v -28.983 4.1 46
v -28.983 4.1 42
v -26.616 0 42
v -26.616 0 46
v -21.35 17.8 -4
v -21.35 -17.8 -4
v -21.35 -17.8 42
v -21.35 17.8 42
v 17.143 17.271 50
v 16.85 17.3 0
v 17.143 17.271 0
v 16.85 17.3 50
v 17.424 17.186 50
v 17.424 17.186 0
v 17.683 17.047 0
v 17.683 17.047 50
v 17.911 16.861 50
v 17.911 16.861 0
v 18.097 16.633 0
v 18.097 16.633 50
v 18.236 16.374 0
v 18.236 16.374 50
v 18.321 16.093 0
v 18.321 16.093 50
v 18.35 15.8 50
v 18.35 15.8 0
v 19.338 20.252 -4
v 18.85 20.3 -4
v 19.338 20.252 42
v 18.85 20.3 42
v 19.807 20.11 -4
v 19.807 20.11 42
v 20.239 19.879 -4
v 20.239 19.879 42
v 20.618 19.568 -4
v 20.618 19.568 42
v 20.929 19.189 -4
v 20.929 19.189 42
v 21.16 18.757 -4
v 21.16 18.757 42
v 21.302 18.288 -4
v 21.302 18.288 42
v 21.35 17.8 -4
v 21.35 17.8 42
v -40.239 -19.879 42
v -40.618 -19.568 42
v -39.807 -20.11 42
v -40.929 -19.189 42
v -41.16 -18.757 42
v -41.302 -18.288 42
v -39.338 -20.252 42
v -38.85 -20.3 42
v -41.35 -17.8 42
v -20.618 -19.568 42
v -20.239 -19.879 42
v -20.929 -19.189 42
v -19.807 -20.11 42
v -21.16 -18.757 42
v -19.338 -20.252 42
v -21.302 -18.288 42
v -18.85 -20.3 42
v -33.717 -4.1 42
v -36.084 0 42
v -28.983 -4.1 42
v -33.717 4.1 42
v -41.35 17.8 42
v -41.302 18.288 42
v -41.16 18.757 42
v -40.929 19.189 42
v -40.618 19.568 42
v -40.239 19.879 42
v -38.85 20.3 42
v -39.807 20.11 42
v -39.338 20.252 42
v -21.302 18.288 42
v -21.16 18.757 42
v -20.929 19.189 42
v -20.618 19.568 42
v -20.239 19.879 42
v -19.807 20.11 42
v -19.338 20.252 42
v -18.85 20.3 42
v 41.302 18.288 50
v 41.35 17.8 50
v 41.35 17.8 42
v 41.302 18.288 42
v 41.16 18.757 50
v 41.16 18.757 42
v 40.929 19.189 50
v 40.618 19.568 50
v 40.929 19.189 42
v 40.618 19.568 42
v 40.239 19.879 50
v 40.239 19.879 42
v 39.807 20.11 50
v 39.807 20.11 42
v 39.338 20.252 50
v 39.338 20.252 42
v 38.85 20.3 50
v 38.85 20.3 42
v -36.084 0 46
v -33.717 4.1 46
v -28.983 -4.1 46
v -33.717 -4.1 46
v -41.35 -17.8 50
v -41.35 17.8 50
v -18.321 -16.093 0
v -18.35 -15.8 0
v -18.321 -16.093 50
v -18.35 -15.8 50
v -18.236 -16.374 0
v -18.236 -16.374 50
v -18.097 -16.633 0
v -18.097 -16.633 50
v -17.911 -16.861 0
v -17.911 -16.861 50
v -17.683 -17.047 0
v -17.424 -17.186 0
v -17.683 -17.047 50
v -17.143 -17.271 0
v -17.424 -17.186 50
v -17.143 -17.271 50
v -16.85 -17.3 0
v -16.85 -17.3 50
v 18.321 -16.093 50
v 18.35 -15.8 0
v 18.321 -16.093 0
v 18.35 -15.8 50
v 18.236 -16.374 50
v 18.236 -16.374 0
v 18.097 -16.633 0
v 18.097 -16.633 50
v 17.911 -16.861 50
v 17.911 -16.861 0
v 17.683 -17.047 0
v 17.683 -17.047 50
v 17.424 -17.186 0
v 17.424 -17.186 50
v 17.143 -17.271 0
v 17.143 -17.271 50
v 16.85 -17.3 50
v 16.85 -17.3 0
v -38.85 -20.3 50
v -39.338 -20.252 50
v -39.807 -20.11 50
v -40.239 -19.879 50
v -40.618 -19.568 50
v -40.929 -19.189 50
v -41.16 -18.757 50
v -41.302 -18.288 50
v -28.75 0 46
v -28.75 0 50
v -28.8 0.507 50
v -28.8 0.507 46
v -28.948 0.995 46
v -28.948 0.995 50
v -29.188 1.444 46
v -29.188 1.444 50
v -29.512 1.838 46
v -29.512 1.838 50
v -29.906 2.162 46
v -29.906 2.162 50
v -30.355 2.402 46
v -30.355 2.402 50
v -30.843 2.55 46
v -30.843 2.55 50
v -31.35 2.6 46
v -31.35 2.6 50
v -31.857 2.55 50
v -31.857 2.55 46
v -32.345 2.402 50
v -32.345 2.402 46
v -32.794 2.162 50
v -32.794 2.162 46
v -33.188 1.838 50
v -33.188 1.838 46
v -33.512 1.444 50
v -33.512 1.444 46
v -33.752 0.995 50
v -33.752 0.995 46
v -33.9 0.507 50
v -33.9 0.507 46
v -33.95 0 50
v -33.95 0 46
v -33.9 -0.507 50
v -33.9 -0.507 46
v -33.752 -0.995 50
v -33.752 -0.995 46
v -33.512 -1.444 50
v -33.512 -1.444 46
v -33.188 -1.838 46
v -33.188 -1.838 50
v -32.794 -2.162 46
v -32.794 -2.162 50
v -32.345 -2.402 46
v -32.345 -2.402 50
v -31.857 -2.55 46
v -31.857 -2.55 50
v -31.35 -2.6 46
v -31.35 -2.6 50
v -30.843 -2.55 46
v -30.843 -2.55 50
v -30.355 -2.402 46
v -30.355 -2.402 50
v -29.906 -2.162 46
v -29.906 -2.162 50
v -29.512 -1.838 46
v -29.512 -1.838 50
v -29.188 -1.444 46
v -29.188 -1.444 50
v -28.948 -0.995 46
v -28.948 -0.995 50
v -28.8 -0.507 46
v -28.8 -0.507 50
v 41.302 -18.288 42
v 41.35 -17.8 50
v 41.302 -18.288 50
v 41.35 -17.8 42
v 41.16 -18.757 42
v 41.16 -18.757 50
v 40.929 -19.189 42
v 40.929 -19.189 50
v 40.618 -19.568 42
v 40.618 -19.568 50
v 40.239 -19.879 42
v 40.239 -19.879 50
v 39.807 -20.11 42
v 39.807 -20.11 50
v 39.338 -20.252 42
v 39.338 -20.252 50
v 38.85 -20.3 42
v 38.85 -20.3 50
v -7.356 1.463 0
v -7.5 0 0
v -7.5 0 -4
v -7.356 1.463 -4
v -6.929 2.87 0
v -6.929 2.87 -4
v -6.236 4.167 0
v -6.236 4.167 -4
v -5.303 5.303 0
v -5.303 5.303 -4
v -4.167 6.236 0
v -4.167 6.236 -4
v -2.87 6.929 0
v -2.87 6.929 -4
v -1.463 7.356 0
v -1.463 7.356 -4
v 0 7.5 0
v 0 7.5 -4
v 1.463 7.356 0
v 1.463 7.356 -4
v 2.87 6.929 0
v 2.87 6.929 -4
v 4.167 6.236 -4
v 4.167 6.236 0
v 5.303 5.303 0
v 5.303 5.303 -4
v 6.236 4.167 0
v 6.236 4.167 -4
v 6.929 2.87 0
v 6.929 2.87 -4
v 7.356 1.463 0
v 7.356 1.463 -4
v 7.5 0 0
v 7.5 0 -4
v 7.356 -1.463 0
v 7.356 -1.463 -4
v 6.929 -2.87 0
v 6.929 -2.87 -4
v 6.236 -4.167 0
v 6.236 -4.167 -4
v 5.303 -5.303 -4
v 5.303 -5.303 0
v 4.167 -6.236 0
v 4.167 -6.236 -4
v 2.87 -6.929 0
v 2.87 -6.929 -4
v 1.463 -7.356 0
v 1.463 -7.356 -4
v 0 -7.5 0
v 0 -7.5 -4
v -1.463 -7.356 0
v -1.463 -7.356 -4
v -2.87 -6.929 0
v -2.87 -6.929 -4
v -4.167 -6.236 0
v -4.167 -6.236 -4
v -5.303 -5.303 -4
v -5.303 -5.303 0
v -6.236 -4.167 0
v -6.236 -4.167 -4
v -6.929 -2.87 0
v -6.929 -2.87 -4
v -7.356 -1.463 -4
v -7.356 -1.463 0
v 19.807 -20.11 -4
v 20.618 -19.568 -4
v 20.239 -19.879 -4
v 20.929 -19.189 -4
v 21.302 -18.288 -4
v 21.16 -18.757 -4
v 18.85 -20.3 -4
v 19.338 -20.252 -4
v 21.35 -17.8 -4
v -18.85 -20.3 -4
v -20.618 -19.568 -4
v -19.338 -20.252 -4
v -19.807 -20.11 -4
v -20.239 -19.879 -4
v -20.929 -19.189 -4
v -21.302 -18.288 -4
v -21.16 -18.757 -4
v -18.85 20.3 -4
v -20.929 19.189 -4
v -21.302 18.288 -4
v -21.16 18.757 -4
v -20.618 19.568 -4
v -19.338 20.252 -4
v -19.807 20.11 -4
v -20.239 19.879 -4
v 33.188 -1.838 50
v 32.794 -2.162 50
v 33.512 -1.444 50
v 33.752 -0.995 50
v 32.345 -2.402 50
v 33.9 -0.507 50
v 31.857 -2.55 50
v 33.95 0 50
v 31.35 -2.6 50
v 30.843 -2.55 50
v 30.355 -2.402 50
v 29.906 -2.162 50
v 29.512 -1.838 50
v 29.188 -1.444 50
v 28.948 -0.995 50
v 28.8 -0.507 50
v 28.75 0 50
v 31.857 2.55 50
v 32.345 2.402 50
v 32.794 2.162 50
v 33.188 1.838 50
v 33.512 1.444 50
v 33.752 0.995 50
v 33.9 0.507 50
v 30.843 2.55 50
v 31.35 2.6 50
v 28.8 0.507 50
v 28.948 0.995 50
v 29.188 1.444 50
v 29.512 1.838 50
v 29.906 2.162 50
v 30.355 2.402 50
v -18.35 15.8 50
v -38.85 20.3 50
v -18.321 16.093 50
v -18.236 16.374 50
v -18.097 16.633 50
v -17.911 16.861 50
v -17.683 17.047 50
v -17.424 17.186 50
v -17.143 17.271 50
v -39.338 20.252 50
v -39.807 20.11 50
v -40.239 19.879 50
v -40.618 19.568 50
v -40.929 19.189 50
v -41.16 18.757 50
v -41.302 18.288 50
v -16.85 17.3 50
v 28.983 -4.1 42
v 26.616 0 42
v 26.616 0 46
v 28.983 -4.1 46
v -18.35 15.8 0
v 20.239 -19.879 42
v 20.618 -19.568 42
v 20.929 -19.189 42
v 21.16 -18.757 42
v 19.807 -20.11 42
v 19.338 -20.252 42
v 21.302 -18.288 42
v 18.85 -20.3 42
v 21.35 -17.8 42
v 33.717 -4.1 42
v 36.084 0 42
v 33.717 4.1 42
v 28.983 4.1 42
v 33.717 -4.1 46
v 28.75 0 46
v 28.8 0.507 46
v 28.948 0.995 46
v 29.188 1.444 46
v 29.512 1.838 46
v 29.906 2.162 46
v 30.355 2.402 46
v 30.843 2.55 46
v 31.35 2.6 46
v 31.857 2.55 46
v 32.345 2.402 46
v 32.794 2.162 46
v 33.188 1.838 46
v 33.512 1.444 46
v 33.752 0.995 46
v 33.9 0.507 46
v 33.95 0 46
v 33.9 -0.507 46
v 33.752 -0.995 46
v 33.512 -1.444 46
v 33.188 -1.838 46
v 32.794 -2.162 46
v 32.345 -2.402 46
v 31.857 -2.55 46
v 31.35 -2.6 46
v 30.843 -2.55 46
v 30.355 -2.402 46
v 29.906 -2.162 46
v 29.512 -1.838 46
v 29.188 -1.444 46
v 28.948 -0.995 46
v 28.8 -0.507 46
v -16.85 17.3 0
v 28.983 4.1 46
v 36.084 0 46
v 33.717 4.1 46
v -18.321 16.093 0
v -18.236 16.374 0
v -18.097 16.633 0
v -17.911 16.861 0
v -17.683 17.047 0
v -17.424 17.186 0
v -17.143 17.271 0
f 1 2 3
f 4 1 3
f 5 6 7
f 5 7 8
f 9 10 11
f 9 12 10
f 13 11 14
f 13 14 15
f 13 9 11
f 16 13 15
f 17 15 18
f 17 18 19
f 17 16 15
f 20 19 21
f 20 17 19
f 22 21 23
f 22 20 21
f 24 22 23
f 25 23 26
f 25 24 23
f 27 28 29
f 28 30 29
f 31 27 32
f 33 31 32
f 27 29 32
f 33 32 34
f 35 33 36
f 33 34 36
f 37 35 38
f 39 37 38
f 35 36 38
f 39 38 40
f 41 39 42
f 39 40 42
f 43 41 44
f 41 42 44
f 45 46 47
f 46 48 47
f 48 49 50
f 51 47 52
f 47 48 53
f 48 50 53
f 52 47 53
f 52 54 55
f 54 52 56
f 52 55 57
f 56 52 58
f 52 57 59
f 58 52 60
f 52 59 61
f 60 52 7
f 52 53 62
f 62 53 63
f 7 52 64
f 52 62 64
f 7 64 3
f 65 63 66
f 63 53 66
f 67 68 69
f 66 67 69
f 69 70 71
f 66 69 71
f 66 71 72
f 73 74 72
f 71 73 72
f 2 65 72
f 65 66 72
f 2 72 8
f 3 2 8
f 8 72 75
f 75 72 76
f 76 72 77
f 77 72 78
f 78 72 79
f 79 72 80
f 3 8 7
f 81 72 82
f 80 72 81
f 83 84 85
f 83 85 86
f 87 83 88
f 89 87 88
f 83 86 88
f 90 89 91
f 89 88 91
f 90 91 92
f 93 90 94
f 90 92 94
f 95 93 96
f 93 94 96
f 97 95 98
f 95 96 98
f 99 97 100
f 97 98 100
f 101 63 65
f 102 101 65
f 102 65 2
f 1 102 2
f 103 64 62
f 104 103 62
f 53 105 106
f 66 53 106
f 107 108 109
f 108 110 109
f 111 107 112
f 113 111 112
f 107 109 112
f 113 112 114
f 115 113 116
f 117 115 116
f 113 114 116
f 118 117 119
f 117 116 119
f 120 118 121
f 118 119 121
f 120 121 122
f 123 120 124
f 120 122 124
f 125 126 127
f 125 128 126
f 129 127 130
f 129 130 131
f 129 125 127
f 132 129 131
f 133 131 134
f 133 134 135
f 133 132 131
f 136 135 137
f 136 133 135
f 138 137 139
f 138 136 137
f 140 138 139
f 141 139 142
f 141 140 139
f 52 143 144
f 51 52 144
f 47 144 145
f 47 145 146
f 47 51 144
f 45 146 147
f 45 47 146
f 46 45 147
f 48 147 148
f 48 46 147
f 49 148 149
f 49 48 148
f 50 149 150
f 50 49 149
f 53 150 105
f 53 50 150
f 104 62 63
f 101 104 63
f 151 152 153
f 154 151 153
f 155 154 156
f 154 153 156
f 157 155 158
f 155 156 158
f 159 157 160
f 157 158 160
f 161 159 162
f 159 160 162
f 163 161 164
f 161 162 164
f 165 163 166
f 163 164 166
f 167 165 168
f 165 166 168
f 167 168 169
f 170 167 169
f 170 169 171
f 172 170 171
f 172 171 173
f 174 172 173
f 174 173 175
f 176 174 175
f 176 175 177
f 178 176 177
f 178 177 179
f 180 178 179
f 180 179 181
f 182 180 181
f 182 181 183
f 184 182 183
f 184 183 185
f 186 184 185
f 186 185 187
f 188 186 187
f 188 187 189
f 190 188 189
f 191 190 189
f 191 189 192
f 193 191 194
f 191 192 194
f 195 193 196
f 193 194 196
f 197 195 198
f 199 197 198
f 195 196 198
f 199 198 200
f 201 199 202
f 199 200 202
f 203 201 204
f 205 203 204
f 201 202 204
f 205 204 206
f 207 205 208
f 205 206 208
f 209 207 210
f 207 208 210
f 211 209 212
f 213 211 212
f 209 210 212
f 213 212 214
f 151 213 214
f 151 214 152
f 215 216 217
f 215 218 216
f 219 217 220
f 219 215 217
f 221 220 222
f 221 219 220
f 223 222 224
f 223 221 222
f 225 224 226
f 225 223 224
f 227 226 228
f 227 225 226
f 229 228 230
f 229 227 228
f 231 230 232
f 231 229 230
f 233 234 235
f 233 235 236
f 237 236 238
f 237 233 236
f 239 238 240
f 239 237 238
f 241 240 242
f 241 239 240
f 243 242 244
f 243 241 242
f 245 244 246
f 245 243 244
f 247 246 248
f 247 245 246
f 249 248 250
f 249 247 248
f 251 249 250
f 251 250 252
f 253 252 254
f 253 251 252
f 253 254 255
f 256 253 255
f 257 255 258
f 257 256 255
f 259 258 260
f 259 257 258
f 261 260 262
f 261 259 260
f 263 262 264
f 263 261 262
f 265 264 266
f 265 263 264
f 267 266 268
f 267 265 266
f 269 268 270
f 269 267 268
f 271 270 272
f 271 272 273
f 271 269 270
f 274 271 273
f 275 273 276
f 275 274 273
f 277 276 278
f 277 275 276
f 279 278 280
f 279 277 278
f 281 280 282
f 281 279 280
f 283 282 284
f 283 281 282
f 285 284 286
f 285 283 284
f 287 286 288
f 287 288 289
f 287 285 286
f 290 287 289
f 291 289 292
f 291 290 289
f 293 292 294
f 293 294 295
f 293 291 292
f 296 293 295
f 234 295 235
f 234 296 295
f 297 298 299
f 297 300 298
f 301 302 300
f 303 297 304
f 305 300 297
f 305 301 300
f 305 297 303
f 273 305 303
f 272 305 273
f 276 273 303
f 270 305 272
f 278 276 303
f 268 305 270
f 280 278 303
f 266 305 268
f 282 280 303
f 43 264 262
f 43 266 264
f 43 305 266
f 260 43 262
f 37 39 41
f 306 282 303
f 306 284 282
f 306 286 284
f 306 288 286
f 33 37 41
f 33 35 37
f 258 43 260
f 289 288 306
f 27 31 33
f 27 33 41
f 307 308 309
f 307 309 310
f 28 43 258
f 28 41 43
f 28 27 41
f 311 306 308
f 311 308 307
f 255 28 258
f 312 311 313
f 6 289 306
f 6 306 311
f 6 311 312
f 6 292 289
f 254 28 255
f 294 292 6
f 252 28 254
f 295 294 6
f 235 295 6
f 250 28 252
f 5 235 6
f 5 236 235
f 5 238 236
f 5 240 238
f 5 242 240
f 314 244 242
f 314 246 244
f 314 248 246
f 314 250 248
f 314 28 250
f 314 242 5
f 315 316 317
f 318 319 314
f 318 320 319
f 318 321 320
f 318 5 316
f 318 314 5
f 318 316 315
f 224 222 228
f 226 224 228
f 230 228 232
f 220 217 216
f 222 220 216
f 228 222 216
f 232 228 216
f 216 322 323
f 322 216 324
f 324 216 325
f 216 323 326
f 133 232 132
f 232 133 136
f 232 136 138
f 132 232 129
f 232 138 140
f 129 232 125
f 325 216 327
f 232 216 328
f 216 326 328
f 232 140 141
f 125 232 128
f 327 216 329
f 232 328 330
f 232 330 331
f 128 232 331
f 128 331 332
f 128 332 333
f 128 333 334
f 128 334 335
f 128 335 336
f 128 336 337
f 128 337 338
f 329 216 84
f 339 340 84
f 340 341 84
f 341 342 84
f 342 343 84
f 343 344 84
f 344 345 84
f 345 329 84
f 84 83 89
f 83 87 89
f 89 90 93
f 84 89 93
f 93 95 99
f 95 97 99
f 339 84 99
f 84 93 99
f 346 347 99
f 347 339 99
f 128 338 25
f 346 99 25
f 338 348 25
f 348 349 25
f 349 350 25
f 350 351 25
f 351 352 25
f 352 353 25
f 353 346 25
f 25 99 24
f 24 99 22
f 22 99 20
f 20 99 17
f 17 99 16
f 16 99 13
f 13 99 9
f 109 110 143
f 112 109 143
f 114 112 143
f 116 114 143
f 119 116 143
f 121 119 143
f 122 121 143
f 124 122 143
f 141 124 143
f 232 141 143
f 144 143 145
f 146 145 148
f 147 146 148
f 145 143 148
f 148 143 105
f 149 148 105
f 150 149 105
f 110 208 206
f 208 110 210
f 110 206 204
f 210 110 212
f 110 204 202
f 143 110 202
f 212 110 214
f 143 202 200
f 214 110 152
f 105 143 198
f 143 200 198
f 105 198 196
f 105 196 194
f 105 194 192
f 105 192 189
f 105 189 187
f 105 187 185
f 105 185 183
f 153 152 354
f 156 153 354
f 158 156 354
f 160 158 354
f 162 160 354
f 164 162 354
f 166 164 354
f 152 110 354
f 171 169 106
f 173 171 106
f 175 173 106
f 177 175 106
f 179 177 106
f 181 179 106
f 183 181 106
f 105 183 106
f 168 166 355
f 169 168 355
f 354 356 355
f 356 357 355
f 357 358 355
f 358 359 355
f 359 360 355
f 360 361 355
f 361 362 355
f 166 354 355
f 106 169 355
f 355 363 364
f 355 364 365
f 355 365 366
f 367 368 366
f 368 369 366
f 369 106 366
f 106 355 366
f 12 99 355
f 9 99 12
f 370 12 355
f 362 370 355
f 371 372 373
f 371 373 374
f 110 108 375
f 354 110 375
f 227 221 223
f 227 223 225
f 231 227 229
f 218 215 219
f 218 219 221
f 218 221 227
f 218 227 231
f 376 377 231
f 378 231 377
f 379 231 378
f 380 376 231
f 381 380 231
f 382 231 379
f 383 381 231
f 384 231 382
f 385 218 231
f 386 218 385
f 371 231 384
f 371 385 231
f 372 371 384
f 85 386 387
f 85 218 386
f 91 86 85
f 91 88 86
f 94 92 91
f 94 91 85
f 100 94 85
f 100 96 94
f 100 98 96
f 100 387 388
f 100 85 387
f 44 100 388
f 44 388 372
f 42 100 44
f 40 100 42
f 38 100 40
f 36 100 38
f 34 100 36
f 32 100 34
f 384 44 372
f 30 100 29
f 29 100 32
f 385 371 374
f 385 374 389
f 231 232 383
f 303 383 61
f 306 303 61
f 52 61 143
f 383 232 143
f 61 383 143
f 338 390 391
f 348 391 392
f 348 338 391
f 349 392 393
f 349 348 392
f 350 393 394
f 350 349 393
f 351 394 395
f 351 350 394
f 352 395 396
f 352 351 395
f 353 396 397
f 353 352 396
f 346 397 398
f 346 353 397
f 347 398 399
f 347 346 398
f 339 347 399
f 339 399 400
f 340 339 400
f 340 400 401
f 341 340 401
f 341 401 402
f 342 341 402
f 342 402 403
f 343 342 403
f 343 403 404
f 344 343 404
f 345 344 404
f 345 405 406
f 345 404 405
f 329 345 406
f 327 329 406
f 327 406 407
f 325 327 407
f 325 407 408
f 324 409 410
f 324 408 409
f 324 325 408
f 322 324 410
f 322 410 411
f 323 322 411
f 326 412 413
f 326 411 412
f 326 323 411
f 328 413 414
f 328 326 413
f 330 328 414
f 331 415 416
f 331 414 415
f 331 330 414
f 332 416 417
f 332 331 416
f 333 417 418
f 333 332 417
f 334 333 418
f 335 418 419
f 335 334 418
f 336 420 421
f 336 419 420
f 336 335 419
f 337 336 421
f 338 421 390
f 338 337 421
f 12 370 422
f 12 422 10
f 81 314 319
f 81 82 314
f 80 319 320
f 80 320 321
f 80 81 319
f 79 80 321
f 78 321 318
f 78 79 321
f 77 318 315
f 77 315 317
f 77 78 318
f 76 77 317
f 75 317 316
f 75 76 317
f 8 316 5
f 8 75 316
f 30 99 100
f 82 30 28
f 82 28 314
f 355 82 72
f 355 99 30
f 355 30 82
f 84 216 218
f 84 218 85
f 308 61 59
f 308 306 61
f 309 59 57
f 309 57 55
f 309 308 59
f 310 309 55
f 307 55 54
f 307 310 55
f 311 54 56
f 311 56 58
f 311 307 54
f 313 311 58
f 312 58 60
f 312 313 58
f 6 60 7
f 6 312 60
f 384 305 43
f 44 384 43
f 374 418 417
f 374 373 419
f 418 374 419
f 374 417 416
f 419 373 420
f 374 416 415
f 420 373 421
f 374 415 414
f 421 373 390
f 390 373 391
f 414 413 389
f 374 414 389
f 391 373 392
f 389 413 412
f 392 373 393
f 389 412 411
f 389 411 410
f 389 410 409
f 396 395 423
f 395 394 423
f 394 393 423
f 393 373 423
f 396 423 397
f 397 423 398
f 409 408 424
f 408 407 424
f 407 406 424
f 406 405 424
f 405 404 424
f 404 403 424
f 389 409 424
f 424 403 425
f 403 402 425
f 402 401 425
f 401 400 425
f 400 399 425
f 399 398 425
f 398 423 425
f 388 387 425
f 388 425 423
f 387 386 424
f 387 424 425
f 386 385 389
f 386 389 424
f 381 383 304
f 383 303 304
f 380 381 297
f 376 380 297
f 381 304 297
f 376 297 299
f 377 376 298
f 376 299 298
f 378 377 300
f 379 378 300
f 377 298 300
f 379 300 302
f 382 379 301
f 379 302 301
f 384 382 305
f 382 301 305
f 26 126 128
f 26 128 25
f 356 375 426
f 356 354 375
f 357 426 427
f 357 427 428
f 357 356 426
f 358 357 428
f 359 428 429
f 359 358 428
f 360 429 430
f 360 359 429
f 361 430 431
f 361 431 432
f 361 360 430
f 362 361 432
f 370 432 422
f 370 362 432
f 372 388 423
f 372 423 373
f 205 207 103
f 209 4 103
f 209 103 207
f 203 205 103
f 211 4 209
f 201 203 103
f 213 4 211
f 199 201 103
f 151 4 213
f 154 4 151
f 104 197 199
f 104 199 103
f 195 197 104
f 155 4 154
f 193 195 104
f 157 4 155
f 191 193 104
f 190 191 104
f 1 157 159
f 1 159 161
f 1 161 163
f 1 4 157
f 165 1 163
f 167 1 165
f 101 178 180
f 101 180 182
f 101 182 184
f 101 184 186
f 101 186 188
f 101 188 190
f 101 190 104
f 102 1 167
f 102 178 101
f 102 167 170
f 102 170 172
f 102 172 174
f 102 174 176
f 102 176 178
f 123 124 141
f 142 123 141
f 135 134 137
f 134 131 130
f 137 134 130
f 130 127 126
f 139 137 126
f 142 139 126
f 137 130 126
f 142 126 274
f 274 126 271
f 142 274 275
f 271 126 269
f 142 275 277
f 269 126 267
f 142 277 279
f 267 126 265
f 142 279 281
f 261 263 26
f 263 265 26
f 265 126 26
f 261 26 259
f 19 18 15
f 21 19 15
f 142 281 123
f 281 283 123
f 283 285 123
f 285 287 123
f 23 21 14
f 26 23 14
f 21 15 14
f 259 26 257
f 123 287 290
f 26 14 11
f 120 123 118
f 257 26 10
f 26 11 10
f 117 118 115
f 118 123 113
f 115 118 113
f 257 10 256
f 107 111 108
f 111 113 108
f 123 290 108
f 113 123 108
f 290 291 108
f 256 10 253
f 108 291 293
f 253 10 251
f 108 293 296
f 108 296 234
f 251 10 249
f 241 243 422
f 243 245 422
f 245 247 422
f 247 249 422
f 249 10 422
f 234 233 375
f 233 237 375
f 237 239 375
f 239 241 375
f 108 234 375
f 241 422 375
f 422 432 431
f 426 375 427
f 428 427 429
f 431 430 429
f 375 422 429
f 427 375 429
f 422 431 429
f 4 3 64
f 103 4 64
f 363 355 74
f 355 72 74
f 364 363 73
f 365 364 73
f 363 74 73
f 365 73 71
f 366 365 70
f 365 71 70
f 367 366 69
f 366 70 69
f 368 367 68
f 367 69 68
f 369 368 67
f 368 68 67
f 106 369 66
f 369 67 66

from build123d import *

# Parameters (mm, degrees)
SKETCH_1_W          = 42.7
SKETCH_1_H          = 40.6
SKETCH_1_W_2        = 36.7
SKETCH_1_H_2        = 34.6
EXTRUDE_1_DEPTH     = 50
SKETCH_2_W          = 42.7
SKETCH_2_H          = 40.6
SKETCH_2_R          = 7.5
EXTRUDE_2_DEPTH     = 4
SKETCH_3_W          = 20
SKETCH_3_H          = 40.6
EXTRUDE_3_DEPTH     = 8
SKETCH_4_R          = 2.6
CUT_EXTRUDE_1_DEPTH = 71.978253712
CUT_EXTRUDE_2_DEPTH = 4
FILLET_1_R          = 2.5
FILLET_2_R          = 1.5


with BuildPart() as part:
    # Эскиз1 → Бобышка-Вытянуть1 (new body)
    with BuildSketch(Plane.XY):
        Rectangle(SKETCH_1_W, SKETCH_1_H)
        Rectangle(SKETCH_1_W_2, SKETCH_1_H_2, mode=Mode.SUBTRACT)
    extrude(amount=EXTRUDE_1_DEPTH)

    # Эскиз2 → Бобышка-Вытянуть2 (add)
    with BuildSketch(Plane(origin=(0, 0, 0), x_dir=(-1, 0, 0), z_dir=(0, 0, -1))):
        Rectangle(SKETCH_2_W, SKETCH_2_H)
        Circle(SKETCH_2_R, mode=Mode.SUBTRACT)
    extrude(amount=EXTRUDE_2_DEPTH)

    # Эскиз3 → Бобышка-Вытянуть3 (add)
    with BuildSketch(Plane.XY.offset(50)):
        with Locations((-31.35, 0)):
            Rectangle(SKETCH_3_W, SKETCH_3_H)
    extrude_3 = extrude(amount=-EXTRUDE_3_DEPTH)

    # Эскиз4 → Вырез-Вытянуть1 (cut, through all)
    with BuildSketch(Plane.XY.offset(50)):
        with Locations((-31.35, 0)):
            Circle(SKETCH_4_R)
    cut_extrude_1 = extrude(amount=-CUT_EXTRUDE_1_DEPTH, mode=Mode.SUBTRACT)

    # Эскиз5 → Вырез-Вытянуть2 (cut)
    with BuildSketch(Plane(origin=(0, 0, 42), x_dir=(-1, 0, 0), z_dir=(0, 0, -1))):
        Polygon((36.084272207, 0), (33.717136104, 4.1), (28.982863896, 4.1), (26.615727793, 0), (28.982863896, -4.1), (33.717136104, -4.1), align=None)
    cut_extrude_2 = extrude(amount=-CUT_EXTRUDE_2_DEPTH, mode=Mode.SUBTRACT)

    # Зеркальное отражение1: Бобышка-Вытянуть3, Вырез-Вытянуть1, Вырез-Вытянуть2 across plane
    add(extrude_3.mirror(Plane(origin=(0, 0, 0), x_dir=(0, 0, 1), z_dir=(1, 0, 0))))
    add(cut_extrude_1.mirror(Plane(origin=(0, 0, 0), x_dir=(0, 0, 1), z_dir=(1, 0, 0))), mode=Mode.SUBTRACT)
    add(cut_extrude_2.mirror(Plane(origin=(0, 0, 0), x_dir=(0, 0, 1), z_dir=(1, 0, 0))), mode=Mode.SUBTRACT)

    # Скругление1
    fillet_1_edges = [part.edges().sort_by_distance(p)[0] for p in [
        (-21.35, 20.3, 19),
        (-21.35, -20.3, 19),
        (-41.35, -20.3, 46),
        (-41.35, 20.3, 46),
        (21.35, -20.3, 19),
        (21.35, 20.3, 19),
        (41.35, 20.3, 46),
        (41.35, -20.3, 46),
    ]]
    fillet(fillet_1_edges, radius=FILLET_1_R)

    # Скругление2
    fillet_2_edges = [part.edges().sort_by_distance(p)[0] for p in [
        (-18.35, 17.3, 25),
        (-18.35, -17.3, 25),
        (18.35, -17.3, 25),
        (18.35, 17.3, 25),
    ]]
    fillet(fillet_2_edges, radius=FILLET_2_R)


solid = part.part
